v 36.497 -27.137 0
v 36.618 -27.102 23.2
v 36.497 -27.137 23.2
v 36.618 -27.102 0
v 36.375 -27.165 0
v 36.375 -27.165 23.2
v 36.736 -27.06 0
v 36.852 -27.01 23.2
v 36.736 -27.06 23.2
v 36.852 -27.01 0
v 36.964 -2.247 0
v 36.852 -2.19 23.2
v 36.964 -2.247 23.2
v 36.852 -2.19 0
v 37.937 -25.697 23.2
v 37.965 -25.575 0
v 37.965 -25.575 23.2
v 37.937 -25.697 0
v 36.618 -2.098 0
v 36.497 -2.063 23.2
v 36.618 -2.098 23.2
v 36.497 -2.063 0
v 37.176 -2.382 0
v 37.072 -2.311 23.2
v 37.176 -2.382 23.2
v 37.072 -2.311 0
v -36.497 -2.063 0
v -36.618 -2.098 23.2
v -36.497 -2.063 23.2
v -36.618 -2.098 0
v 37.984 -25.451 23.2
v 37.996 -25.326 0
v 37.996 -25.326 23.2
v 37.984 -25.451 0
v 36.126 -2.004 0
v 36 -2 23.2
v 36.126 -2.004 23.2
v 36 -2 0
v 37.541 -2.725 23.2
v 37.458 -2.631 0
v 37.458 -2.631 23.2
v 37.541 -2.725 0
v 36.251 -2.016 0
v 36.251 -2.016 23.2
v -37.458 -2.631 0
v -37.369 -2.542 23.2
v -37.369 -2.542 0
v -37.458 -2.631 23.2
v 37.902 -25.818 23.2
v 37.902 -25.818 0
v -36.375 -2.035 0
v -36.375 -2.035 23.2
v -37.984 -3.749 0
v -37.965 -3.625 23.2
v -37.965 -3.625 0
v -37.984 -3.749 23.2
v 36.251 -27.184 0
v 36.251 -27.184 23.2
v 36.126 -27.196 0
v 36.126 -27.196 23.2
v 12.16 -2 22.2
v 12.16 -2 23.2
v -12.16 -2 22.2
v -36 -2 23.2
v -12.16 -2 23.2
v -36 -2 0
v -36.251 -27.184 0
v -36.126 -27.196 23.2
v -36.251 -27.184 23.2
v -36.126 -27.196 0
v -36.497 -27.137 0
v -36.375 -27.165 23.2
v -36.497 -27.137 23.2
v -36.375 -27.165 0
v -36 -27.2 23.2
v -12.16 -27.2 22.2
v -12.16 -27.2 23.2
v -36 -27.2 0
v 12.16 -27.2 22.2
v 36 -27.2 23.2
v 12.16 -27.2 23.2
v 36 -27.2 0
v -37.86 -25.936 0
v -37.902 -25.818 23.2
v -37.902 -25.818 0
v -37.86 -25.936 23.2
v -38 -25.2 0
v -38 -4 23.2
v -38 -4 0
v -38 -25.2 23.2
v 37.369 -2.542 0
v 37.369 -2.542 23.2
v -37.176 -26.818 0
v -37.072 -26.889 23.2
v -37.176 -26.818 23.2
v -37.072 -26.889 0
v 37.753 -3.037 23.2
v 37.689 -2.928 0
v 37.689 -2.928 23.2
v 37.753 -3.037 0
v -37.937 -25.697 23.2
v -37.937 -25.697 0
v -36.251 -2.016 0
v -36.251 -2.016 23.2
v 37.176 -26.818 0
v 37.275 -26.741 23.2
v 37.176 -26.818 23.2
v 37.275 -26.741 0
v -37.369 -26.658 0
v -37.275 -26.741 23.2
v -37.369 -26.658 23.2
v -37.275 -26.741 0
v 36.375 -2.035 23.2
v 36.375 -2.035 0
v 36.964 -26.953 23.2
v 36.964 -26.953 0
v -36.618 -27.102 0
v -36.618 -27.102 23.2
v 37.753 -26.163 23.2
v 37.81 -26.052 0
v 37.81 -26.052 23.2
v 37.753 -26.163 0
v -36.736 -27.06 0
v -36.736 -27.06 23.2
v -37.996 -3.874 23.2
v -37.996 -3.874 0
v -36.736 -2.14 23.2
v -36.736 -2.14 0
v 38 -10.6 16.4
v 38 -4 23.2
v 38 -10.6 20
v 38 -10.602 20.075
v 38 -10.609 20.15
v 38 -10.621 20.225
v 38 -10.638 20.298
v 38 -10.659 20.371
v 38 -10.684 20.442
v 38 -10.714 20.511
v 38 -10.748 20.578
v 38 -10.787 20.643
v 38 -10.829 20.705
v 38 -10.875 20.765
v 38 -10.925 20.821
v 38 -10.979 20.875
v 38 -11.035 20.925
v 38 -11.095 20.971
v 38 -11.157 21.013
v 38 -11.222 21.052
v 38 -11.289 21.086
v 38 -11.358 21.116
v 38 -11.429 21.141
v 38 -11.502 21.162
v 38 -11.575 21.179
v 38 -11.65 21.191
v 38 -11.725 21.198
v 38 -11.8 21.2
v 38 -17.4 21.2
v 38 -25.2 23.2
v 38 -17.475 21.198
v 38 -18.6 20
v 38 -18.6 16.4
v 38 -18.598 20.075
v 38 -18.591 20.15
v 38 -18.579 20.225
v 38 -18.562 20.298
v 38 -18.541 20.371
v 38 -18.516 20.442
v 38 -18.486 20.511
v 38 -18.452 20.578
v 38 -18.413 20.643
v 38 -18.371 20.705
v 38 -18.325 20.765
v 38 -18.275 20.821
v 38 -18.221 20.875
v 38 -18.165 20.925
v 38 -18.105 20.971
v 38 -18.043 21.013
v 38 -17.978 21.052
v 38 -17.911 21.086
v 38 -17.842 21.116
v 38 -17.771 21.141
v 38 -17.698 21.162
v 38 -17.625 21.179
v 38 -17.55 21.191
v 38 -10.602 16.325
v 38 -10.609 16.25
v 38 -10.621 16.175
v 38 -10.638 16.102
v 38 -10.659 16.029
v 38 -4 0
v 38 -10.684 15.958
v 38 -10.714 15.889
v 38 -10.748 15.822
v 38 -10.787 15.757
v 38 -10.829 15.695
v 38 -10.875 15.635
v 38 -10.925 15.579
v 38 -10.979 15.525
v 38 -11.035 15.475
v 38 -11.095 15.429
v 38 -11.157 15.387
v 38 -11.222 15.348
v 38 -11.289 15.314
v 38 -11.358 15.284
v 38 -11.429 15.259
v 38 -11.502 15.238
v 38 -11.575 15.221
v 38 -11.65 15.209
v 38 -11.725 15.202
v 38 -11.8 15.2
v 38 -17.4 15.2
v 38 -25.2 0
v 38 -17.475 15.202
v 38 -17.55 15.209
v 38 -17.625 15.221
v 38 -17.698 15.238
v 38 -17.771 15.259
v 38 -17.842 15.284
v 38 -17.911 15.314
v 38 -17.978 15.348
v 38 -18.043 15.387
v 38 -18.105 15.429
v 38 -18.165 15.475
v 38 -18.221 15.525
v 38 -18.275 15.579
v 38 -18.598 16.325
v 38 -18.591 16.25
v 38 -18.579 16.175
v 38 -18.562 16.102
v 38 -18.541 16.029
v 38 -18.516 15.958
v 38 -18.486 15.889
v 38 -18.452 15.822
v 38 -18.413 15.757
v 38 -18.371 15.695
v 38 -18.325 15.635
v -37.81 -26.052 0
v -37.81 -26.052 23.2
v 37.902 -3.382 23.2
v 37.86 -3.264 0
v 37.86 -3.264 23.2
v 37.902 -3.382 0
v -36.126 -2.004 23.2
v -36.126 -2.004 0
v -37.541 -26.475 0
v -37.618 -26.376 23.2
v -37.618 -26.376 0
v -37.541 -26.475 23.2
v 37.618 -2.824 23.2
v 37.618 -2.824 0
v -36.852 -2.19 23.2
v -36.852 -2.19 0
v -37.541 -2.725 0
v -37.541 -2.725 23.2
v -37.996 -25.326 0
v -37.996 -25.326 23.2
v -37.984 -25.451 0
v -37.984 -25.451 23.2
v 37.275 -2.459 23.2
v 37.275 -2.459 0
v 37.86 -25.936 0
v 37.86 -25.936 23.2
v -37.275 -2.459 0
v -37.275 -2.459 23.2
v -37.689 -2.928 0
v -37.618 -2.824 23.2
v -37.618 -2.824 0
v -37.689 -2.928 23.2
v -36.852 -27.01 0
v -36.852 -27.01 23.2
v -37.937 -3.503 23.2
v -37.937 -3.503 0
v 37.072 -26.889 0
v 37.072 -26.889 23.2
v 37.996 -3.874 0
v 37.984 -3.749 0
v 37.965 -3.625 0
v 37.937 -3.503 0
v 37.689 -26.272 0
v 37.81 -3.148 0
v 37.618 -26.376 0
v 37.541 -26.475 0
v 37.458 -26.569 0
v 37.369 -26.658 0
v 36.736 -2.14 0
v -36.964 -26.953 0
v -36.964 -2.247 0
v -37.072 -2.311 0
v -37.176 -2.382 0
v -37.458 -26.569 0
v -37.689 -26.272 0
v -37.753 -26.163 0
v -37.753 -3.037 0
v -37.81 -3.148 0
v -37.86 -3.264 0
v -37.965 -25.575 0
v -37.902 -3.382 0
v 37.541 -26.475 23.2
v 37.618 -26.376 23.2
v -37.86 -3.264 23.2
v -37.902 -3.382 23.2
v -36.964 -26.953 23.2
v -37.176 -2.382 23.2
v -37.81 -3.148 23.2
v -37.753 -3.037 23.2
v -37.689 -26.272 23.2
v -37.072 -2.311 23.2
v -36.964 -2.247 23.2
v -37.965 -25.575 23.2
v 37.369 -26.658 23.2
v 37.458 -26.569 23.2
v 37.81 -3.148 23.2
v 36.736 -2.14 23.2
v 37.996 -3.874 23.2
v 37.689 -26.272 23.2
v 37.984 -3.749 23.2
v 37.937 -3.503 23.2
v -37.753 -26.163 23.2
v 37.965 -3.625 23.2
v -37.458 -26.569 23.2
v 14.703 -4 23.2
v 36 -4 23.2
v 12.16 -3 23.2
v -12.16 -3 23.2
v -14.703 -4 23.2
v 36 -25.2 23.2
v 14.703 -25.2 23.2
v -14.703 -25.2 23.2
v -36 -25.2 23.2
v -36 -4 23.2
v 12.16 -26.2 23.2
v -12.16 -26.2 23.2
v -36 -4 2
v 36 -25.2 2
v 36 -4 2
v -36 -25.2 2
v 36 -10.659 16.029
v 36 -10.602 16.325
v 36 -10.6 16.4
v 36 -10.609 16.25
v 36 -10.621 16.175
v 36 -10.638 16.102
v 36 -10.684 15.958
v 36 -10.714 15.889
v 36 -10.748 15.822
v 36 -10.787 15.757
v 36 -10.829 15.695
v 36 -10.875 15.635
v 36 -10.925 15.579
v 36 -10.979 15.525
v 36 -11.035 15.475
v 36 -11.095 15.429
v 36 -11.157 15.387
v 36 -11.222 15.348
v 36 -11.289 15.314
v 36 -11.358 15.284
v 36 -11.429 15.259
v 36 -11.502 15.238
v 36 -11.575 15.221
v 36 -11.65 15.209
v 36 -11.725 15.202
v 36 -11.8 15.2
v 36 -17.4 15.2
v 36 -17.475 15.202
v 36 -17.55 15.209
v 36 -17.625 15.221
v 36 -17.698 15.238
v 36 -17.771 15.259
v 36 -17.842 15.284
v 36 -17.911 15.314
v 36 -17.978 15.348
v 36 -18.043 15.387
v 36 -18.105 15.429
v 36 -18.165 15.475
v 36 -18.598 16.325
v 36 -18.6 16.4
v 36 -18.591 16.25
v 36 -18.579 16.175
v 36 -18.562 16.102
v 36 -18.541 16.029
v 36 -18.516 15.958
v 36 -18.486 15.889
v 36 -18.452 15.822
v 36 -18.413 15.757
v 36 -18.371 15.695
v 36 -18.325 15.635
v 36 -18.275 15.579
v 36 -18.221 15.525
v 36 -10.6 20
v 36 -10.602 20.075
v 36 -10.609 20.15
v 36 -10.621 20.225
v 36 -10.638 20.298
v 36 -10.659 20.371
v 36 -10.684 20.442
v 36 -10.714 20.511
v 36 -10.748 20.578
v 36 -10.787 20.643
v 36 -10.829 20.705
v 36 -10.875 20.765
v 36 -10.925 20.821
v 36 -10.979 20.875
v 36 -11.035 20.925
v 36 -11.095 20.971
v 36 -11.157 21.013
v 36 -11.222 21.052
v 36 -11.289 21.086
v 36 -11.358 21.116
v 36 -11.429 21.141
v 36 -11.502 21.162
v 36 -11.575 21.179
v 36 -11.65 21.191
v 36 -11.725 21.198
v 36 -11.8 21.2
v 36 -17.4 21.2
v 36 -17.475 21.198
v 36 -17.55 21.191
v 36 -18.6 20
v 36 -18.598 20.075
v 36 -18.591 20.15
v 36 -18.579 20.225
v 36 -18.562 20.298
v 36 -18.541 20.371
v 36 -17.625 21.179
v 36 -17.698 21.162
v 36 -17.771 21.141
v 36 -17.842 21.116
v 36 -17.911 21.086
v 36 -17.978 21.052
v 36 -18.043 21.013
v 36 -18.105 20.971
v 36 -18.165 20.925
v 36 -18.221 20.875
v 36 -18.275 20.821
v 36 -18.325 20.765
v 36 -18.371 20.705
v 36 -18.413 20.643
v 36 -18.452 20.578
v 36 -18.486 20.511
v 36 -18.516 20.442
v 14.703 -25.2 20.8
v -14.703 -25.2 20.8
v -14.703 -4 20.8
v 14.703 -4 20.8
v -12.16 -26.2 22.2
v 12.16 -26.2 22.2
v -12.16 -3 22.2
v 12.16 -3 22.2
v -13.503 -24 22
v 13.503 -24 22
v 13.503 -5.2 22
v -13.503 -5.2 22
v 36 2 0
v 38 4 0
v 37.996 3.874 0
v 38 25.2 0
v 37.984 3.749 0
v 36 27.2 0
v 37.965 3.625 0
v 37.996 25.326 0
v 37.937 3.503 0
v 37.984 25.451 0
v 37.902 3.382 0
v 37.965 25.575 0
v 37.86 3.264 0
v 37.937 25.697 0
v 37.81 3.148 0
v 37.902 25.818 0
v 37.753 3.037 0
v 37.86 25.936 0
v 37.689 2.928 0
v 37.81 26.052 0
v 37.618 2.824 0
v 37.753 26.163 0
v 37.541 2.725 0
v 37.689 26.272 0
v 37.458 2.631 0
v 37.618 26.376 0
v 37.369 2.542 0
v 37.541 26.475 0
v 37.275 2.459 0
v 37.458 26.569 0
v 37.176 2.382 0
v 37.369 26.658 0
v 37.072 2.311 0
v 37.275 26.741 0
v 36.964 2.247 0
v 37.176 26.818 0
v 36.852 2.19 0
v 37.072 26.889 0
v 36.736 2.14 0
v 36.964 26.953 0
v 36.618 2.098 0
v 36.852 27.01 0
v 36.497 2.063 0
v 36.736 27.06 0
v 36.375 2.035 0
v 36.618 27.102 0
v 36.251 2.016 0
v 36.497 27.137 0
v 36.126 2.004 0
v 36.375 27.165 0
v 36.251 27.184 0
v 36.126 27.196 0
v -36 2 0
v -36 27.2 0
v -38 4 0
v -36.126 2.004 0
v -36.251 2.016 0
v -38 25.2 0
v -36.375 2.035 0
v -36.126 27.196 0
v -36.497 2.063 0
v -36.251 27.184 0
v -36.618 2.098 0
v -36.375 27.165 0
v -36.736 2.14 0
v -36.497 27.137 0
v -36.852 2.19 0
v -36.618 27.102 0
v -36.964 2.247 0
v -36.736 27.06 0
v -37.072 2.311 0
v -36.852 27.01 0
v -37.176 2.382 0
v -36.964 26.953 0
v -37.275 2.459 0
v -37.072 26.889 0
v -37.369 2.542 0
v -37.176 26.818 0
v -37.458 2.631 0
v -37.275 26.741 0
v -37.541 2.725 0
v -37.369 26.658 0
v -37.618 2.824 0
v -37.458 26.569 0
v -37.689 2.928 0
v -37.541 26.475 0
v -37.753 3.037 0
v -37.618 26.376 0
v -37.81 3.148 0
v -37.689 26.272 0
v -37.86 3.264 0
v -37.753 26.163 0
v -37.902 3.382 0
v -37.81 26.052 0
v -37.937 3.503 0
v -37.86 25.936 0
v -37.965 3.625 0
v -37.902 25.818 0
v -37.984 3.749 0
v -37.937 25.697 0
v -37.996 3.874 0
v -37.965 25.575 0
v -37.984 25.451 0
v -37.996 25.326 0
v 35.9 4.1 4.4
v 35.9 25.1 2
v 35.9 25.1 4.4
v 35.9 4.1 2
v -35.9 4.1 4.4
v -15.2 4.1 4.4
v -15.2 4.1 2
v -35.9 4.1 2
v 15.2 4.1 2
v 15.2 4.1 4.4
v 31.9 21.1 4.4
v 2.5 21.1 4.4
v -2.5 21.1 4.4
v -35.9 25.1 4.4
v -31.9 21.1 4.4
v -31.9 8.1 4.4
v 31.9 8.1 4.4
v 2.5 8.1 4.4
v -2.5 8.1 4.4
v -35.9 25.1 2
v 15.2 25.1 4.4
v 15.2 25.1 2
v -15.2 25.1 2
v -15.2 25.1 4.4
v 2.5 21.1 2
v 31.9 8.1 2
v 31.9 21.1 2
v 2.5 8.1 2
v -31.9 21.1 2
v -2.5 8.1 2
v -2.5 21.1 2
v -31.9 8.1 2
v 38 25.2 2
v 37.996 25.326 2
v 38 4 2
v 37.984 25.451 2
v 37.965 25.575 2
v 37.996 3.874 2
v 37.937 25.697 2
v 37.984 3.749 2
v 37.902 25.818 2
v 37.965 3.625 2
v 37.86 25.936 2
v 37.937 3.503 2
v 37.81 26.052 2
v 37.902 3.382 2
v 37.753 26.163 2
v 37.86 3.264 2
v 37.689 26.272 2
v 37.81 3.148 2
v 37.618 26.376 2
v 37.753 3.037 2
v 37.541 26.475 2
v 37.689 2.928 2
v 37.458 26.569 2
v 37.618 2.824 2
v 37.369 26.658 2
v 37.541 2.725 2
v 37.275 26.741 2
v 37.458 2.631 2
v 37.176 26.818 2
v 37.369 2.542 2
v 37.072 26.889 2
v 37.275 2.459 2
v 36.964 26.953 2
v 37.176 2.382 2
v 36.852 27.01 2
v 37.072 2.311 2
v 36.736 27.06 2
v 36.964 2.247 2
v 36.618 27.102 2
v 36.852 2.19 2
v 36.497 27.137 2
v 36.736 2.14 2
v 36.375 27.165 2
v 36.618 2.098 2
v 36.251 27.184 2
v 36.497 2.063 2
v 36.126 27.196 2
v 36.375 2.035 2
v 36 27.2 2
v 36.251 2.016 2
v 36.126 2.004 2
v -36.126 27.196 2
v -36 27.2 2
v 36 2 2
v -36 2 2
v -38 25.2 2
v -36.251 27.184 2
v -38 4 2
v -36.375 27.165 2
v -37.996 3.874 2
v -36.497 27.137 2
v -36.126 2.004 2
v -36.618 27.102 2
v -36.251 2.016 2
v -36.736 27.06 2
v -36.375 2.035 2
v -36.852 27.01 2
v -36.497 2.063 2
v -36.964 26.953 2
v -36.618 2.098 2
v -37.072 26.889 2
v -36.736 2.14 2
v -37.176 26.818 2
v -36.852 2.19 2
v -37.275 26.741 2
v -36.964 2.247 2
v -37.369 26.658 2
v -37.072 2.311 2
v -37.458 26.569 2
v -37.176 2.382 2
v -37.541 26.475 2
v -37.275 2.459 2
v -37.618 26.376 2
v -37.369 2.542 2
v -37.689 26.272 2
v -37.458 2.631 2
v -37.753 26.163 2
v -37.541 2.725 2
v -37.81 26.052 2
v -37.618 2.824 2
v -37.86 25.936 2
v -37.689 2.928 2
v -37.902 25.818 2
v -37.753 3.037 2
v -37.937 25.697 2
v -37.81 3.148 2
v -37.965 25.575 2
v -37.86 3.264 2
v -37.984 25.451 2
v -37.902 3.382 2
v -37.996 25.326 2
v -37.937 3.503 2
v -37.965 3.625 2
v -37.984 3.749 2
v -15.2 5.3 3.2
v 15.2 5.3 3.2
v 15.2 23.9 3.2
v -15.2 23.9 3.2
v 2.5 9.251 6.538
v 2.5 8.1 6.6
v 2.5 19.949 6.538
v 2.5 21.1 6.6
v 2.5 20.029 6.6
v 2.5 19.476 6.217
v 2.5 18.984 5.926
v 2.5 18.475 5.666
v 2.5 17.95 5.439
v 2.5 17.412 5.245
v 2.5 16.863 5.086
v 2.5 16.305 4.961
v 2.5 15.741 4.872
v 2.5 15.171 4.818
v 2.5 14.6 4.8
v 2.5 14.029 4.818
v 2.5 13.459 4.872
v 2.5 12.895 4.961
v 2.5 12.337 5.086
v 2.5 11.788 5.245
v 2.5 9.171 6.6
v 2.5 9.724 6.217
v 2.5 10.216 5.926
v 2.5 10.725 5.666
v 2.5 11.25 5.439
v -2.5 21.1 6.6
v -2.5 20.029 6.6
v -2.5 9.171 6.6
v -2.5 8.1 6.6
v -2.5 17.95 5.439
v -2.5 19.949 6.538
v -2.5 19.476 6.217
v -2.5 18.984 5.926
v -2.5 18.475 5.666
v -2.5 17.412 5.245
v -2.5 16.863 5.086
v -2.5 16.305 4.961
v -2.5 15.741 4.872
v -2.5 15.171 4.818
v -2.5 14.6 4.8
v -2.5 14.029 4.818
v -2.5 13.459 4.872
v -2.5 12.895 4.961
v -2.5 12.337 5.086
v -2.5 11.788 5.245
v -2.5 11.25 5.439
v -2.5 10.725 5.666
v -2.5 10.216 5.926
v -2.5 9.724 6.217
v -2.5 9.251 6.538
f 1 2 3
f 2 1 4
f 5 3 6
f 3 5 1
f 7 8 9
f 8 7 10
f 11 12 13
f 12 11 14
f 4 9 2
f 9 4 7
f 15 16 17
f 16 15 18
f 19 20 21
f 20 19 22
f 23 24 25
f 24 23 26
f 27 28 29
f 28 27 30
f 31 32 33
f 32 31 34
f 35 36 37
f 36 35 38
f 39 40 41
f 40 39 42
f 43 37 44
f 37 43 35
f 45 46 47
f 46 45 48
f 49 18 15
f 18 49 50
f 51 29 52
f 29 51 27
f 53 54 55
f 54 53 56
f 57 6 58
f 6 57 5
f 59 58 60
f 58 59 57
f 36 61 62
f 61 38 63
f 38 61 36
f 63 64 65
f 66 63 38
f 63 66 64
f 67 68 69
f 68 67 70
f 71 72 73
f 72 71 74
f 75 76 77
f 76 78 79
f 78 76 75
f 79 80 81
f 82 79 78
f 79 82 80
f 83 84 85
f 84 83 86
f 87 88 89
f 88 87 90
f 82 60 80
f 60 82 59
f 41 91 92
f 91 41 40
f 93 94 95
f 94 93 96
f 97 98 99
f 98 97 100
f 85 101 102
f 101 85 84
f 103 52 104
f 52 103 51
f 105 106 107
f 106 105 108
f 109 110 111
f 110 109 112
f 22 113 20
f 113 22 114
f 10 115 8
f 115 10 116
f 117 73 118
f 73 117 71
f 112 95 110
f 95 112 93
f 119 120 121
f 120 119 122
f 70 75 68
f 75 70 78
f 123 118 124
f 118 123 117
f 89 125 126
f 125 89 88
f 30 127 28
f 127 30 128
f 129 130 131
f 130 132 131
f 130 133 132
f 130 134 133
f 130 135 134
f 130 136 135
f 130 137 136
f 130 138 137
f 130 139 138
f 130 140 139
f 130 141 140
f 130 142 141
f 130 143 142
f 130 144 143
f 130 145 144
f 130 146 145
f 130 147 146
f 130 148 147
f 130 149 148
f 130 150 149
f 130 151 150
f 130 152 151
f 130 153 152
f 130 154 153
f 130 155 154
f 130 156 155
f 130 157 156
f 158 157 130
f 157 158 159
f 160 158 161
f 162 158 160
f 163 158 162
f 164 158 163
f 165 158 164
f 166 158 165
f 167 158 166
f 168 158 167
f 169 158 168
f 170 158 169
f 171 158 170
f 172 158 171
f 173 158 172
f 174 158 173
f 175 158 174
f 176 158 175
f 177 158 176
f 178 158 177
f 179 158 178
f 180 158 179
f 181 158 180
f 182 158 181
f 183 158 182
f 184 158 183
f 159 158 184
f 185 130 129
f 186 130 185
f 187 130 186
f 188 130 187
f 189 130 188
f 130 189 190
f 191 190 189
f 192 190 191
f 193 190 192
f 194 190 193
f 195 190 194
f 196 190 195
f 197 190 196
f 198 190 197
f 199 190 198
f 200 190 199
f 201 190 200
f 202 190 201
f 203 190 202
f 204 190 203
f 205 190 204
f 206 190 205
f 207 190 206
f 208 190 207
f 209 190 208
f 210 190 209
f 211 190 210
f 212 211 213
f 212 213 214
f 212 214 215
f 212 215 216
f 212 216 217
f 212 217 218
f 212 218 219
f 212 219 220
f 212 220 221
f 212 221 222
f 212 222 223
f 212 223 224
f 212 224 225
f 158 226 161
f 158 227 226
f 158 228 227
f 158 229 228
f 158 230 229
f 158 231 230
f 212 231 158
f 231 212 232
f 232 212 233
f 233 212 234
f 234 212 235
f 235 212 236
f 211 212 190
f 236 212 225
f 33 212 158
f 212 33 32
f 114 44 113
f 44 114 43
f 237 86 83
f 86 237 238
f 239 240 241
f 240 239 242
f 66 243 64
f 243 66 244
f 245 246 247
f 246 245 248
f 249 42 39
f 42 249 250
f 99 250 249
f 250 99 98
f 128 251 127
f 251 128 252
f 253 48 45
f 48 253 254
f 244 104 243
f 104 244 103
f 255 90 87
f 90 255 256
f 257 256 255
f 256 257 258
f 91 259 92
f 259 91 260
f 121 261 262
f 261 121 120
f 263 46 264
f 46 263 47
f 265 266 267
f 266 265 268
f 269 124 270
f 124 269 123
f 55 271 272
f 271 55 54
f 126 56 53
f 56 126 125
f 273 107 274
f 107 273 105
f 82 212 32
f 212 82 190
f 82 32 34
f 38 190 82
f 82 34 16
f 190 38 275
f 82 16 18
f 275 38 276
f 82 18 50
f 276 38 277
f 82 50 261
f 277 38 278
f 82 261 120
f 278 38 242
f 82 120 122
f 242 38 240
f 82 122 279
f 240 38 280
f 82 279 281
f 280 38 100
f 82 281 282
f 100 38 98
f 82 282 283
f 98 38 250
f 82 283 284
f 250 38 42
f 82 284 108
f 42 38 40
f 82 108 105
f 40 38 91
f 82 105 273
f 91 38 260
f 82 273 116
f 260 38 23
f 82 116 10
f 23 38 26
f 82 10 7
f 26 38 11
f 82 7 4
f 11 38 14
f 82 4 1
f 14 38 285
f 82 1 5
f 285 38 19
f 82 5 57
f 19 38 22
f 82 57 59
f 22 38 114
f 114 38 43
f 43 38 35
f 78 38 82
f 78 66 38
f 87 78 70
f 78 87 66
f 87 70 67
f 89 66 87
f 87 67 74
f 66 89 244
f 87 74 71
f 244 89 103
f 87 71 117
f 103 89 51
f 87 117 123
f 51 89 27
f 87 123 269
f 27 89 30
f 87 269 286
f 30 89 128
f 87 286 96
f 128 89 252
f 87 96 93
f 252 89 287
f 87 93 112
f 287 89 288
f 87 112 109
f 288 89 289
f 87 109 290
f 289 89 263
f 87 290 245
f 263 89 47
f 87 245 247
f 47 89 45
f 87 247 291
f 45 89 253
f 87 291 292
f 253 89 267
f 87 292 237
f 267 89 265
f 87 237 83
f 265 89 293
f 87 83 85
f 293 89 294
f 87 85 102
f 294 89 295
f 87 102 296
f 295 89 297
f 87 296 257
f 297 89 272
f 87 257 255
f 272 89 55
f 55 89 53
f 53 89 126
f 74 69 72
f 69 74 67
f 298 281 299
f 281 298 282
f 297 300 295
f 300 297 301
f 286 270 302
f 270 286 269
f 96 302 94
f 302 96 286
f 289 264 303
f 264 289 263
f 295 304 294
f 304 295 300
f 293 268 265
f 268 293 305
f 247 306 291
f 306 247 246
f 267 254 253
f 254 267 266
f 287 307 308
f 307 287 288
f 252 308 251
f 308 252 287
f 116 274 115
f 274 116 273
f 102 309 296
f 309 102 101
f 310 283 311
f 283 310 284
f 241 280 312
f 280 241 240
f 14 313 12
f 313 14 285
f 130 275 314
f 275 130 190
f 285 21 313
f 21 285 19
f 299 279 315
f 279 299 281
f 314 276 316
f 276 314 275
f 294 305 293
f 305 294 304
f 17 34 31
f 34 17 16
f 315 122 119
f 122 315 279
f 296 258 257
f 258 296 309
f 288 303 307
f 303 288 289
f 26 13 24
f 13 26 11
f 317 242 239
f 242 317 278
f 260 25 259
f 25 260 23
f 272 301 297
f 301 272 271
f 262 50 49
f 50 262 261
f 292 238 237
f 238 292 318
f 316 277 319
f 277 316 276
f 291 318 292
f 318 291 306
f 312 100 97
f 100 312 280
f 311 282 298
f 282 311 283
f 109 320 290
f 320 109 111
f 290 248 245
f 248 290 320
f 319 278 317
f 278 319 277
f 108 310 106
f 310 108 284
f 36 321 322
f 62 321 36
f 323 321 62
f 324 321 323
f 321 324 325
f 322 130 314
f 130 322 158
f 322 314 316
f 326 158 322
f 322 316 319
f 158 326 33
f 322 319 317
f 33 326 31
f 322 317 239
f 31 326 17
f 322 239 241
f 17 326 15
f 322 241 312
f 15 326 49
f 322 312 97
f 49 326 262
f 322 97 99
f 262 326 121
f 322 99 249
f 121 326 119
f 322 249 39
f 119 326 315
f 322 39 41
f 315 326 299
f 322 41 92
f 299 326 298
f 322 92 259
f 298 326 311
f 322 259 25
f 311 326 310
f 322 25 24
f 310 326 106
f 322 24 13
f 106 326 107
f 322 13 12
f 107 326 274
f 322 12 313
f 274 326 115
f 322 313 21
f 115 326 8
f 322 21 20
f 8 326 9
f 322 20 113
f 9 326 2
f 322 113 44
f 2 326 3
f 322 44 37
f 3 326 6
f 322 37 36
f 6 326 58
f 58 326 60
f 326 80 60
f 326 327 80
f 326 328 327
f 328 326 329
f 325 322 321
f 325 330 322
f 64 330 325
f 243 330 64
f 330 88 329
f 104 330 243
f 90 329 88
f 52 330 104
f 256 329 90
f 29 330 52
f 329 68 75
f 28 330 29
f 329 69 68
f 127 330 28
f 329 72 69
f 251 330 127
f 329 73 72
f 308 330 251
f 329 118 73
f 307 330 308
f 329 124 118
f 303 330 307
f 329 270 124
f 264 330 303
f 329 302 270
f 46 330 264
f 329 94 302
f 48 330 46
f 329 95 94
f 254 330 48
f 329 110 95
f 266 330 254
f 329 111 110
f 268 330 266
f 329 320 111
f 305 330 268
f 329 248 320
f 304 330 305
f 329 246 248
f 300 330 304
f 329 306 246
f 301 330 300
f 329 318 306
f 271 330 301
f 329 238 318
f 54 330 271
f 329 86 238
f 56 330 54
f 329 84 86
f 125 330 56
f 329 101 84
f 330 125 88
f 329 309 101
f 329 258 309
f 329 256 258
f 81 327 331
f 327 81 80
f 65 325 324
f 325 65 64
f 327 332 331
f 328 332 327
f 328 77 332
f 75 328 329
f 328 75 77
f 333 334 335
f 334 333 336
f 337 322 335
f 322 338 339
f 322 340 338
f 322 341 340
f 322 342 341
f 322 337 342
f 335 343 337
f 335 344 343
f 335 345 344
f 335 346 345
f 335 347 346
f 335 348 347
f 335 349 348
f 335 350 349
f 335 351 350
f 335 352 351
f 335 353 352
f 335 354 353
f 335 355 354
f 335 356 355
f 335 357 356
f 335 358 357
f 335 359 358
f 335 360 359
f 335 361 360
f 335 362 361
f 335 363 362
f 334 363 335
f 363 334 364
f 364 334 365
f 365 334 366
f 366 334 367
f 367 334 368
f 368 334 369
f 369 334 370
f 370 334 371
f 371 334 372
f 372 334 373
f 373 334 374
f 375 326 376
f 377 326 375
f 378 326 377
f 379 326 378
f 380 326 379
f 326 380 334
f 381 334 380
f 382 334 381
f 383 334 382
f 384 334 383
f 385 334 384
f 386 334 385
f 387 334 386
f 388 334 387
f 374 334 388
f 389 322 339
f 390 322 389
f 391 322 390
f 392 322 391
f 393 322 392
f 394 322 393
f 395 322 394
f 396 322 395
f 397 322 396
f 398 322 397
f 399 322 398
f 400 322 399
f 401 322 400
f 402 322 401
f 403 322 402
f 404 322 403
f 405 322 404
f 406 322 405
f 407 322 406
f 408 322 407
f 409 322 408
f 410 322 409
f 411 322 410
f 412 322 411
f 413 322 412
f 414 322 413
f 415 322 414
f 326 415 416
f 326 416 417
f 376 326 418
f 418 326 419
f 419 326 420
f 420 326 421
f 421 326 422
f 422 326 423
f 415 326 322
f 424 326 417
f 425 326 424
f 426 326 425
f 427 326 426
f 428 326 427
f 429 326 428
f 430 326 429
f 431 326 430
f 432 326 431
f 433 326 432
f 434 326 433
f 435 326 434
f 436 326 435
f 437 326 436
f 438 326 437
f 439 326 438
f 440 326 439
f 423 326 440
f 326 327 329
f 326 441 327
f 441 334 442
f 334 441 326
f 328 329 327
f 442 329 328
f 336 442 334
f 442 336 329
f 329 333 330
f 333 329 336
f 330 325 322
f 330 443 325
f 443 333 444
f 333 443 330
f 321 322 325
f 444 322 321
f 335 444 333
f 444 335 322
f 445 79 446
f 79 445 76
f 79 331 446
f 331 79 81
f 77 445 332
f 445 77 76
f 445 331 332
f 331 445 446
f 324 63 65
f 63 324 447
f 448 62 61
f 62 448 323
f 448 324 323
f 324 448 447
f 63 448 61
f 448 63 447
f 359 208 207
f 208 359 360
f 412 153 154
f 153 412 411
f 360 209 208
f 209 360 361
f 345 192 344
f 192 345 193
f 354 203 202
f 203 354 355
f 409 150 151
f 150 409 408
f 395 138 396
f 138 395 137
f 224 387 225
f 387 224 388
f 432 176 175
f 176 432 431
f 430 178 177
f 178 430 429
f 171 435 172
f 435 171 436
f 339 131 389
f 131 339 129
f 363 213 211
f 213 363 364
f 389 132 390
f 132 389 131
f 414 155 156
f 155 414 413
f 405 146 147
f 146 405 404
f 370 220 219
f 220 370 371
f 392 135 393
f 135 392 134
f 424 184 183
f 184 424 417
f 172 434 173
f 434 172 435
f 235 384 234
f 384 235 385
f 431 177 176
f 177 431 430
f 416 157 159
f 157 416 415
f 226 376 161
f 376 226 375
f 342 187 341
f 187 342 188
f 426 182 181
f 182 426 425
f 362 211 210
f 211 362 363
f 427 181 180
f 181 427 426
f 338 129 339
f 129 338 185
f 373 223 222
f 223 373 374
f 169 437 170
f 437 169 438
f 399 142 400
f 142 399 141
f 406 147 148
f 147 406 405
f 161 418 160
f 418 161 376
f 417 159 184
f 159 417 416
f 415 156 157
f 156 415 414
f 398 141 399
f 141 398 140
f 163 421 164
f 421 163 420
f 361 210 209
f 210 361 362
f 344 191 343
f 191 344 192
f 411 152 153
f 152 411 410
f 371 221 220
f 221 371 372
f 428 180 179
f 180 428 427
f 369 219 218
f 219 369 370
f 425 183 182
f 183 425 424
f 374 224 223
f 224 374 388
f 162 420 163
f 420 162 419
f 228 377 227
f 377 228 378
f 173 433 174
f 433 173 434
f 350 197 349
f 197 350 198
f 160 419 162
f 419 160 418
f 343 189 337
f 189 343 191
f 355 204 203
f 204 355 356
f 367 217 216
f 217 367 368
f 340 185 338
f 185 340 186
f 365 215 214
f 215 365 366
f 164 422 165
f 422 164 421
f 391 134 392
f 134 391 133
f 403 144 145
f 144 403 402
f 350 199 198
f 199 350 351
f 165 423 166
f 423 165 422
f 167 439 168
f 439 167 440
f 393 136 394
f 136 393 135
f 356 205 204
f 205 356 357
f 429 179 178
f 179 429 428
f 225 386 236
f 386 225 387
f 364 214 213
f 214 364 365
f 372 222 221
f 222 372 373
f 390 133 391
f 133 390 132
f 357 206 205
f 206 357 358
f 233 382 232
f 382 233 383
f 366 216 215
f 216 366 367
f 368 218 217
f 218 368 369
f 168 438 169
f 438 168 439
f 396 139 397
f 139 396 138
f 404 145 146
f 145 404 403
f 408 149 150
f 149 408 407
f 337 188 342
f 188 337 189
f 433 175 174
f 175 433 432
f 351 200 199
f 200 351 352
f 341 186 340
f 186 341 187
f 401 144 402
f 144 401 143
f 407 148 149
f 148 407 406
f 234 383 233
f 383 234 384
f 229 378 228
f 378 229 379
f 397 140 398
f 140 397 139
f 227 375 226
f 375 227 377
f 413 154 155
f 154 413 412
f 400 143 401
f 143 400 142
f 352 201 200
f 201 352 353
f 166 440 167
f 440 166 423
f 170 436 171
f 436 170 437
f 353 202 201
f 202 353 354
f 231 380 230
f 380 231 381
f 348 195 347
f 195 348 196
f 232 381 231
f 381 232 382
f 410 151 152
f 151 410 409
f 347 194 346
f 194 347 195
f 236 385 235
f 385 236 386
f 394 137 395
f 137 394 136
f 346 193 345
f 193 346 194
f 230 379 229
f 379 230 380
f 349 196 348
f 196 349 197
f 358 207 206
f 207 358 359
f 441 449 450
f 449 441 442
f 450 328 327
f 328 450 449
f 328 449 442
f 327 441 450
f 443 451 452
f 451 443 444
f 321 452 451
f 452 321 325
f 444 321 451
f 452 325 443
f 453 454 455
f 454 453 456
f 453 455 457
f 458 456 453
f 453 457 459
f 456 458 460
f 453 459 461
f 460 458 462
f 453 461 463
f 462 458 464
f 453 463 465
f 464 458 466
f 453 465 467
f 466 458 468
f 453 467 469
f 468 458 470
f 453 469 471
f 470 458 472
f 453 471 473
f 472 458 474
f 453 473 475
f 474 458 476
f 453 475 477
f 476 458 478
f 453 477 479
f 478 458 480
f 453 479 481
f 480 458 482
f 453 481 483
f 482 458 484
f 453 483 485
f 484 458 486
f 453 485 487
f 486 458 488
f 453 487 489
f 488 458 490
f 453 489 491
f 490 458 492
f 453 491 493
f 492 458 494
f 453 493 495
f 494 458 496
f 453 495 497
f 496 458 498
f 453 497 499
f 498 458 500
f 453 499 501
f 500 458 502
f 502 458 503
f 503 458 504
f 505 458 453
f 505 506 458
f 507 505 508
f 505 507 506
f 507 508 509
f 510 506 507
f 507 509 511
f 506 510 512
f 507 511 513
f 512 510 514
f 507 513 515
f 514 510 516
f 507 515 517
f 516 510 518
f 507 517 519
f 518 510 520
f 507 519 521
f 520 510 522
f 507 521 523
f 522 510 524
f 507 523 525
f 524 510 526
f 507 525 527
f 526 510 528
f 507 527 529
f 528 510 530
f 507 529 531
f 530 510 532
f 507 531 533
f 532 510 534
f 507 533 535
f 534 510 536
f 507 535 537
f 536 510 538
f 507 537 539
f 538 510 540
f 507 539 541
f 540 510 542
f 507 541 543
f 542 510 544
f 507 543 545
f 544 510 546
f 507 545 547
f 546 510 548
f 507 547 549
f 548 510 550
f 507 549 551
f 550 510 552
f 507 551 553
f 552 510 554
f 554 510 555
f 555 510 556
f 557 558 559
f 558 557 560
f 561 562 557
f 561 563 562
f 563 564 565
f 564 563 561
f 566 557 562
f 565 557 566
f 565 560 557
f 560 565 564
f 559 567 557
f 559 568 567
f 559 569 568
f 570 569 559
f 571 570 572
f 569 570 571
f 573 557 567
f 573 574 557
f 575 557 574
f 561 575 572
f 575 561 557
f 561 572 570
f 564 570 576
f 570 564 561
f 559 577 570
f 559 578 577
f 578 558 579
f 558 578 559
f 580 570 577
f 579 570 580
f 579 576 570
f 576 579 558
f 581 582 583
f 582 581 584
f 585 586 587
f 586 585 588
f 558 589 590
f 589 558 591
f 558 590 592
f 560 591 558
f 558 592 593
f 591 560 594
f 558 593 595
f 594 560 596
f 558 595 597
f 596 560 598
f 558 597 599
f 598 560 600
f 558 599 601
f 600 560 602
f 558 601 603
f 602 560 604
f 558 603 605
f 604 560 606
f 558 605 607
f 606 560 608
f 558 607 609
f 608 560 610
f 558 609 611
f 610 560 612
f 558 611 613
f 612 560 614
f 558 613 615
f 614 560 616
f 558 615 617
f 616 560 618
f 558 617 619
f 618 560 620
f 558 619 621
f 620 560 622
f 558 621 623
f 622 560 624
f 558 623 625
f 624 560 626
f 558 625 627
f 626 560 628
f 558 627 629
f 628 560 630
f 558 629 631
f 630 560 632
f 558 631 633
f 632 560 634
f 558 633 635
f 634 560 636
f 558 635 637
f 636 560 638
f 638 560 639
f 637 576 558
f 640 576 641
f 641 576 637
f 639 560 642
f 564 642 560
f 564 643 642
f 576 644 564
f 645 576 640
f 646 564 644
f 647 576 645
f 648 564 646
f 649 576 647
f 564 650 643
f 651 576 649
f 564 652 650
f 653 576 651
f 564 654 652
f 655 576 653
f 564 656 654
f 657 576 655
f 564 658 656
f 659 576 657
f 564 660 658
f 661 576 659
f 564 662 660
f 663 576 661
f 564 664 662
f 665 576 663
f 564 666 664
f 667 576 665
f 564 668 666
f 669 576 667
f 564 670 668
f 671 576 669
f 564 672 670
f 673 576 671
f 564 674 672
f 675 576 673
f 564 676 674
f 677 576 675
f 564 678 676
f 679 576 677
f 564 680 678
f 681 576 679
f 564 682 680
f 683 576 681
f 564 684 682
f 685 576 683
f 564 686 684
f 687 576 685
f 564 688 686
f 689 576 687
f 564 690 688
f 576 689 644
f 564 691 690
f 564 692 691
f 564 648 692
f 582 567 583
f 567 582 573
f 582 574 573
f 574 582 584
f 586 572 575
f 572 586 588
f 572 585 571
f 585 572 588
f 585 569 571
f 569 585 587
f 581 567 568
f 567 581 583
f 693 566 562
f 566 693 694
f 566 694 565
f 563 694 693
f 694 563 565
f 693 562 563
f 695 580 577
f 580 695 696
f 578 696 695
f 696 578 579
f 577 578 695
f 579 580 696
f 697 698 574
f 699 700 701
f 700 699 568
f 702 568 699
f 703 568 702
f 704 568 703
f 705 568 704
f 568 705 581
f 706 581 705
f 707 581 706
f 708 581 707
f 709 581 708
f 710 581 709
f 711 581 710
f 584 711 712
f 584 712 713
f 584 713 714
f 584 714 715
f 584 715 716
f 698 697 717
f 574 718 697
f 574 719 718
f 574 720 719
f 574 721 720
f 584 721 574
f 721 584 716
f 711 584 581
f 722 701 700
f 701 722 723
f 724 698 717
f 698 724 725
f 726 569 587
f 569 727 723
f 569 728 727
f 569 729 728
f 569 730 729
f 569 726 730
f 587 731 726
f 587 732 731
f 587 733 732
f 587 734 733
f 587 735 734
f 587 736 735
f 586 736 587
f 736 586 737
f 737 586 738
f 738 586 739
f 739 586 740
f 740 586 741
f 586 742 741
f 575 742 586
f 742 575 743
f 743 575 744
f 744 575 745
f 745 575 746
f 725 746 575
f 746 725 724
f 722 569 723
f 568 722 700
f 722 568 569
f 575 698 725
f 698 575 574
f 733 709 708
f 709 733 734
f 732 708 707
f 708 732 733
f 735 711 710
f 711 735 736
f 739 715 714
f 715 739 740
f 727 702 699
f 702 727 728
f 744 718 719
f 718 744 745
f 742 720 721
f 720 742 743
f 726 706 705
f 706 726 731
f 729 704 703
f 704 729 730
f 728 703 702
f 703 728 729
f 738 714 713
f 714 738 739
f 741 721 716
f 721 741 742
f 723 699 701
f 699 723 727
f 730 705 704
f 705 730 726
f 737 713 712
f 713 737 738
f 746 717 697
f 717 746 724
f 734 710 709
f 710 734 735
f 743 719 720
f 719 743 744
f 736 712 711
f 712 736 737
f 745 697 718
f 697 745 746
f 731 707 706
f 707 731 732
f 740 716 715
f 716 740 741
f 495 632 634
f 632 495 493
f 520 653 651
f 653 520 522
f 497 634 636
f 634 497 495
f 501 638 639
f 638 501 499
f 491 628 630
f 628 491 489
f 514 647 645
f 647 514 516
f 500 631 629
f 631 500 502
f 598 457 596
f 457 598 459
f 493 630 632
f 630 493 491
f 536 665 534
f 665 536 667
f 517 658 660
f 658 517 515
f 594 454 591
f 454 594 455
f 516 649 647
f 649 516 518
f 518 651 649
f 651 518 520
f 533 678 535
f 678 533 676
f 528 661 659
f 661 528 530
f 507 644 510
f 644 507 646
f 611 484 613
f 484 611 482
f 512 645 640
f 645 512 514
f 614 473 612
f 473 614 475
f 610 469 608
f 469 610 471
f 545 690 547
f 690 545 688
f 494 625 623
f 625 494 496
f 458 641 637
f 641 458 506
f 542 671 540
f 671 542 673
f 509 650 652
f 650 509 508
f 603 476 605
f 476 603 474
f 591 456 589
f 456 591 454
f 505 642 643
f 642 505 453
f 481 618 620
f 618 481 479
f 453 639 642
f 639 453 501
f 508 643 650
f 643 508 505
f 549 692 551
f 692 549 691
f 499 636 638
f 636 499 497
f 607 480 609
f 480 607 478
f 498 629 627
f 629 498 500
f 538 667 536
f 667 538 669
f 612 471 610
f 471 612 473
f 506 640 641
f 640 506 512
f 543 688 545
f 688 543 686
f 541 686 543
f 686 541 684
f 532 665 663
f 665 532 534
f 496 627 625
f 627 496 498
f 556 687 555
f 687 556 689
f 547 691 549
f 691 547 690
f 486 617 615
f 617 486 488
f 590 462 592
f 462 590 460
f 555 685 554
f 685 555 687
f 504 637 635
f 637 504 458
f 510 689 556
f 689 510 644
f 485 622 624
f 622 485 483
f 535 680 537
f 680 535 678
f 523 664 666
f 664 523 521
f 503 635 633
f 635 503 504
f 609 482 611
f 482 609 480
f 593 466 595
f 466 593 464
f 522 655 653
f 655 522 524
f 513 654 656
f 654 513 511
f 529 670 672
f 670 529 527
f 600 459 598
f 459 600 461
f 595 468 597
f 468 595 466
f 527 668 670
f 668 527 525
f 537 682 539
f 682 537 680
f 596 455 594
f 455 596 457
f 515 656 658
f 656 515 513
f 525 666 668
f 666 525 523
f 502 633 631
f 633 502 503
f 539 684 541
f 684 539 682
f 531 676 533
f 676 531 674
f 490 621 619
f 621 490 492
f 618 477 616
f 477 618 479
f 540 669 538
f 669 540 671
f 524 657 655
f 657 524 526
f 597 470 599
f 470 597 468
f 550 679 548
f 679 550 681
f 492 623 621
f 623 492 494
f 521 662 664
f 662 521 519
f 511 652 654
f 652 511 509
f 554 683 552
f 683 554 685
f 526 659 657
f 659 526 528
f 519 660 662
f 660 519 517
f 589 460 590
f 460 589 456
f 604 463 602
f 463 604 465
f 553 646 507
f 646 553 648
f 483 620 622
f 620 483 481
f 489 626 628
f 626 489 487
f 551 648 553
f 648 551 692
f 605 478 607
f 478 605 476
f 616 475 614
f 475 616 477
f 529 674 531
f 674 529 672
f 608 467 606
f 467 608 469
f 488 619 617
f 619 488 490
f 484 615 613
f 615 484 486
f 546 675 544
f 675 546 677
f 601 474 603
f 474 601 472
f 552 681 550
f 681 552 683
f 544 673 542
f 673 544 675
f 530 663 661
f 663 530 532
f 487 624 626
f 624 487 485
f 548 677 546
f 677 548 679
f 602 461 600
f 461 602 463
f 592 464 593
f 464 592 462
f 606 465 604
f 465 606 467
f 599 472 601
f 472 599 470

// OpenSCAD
/* [Hidden] */

battery_length = 70.0;
battery_diameter = 18.2;

/* [STL export] */

// Which one would you like to see?
part = 0;//[0:Both - side by side, 1:Both - closed box, 2:Box only, 3: Top only]

// Draw the battery?
draw_battery=0;//[0: No, 1: Yes]

/* [Hidden] */

// Size of your printer's nozzle in mm
nozzle_size = 0.2; //[0:0.05:2]

// Number of walls the print should have
number_of_walls = 10;

// Tolerance (use 0.2 for FDM)
tolerance = 0.2; // [0.1:0.1:0.4]

// Interior dimension X in mm
interior_width = battery_length + 2; //[0:0.05:200.0]

// Interior dimension Y in mm
interior_length = battery_diameter + 3.0; //[0:0.05:200.0]

// Interior dimension Z in mm
interior_height = battery_diameter + 3.0; //[0:0.05:200.0]

// interior corner radius in mm
radius = 0.0;

/* [Hidden] */

// Number of walls the hook should have
hook_walls = 6;

// What fraction of the flat X side should the hook take up? (0 for no hook)
x_hook_fraction = 0.4; // [0:0.1:1.0]

// What fraction of the left/right hooks should have a slot behind them? (0 for no slot)
x_slot_fraction = 0.8; // [0:0.1:2]

// What fraction of the flat Y side should the hook take up? (0 for no hook)
y_hook_fraction = 0.0; // [0:0.1:1.0]

// What fraction of the top/bottom hooks should have a slot behind them? (0 for no slot)
y_slot_fraction = 0.8; // [0:0.1:2]

/* [Hidden] */
$fn=100;

wall_thickness = nozzle_size * number_of_walls;

// Outer dimensions
exterior_width = interior_width + 2 * wall_thickness;
exterior_length = interior_length + 2 * wall_thickness;
exterior_height = interior_height + 2 * wall_thickness;

hook_thickness = hook_walls * nozzle_size;

top_cover_wall_thickness = hook_thickness + wall_thickness;

y_hook_length = (exterior_length - 2 * radius) * y_hook_fraction;
x_hook_length = (exterior_width - 2 * radius) * x_hook_fraction;

battery_x = 0;
battery_y = 0;

module battery(c = "blue") {
    
    translate([battery_x, battery_y, wall_thickness + battery_diameter/2]) rotate([0, 90, 0]) {
        color(c)
        cylinder(h=battery_length, d=battery_diameter, center=true);
    }
}

module battery_cable_hole() {
    battery_cable_radius = 1.2;
    battery_cable_width = 8.0;
    battery_cable_height = 6.0;
    battery_cable_hole_length = 10;

    battery_cable_x = (interior_width - battery_cable_hole_length + wall_thickness)/2;
    battery_cable_z = battery_cable_height/2 + battery_diameter - 3.0;

    color("Red") {
        translate([battery_cable_x, 0, battery_cable_z]) rotate([90, 0, 90]) 
        linear_extrude(battery_cable_hole_length) {
            rounded_rect(battery_cable_radius, battery_cable_width, battery_cable_height, center=true);
        }
    }
}


module box_interior() {
    offset(r=radius) {
        square([interior_width-2*radius, interior_length-2*radius], center=true);
    }
}

module box_exterior() {
    offset(r=wall_thickness) {
        box_interior();
    }
}

module rounded_rect(r, w, l, center=true) {
    offset(r=r) {
        square([w-2*r, l-2*r], center=center);
    }    
}

module bottom_box() {
    difference() {
        // Solid box
        linear_extrude(exterior_height - wall_thickness) {
            box_exterior();
        }
        
        // Hollow out
        translate([0, 0, wall_thickness]) linear_extrude(exterior_height) {
            box_interior();
        }

        // Left/right slots
        left_slot();
        rotate([180,180,0]) left_slot();

        // Front/back slots
        front_slot();
        rotate([180,180,0]) front_slot();

        battery_cable_hole();
    }

    // Left/Right hook
    left_hook();
    rotate([180,180,0]) left_hook();

    // Front/Back hook
    front_hook();
    rotate([180,180,0]) front_hook();
}

module left_hook() {
    translate([(exterior_width - 2 * wall_thickness)/2, -y_hook_length / 2, exterior_height - wall_thickness]) 
    rotate([0,90,90]) {
        base_hook(y_hook_length);
    }
}

module front_hook() {
    translate([-x_hook_length/2, -exterior_length/2 + wall_thickness, exterior_height - wall_thickness]) 
    rotate([90, 90, 90]) {
        base_hook(x_hook_length);
    }
}

module base_hook(hook_length) {
    difference(){
        linear_extrude(hook_length){
            polygon(points=[[0,0],[2*hook_thickness,0],[hook_thickness,hook_thickness]]);
        }
        translate([hook_thickness, hook_thickness, 0]) rotate([45,0,0]) cube(2*hook_thickness, center=true);
        translate([hook_thickness, hook_thickness, hook_length]) rotate([45,0,0]) cube(2*hook_thickness, center=true);        
    }
}

module left_slot() {
    x_slot_fraction = y_hook_length * x_slot_fraction;
    epsilon=2; // ensure it definitely protrudes

    translate([exterior_width / 2 + epsilon + wall_thickness/2, -x_slot_fraction / 2, exterior_height - wall_thickness/2]) 
    rotate([0,90,90]) {
        cube([wall_thickness, wall_thickness+epsilon, x_slot_fraction]);
    }
}

module front_slot() {
    y_slot_fraction = x_hook_length * y_slot_fraction;

    epsilon=2; // ensure it definitely protrudes
    translate([-y_slot_fraction / 2, -exterior_length / 2 - epsilon - wall_thickness/2, exterior_height - wall_thickness/2]) 
    rotate([90,90,90]) {
        cube([wall_thickness, wall_thickness+epsilon, y_slot_fraction]);
    }
}

module right_groove() {
    translate([-tolerance/2 + (exterior_width-2*wall_thickness) / 2,-y_hook_length/2,wall_thickness+hook_thickness*2]) rotate([0,90,90]) linear_extrude(y_hook_length) {
        base_groove();
    }
}


module front_groove() {
    translate([-x_hook_length/2, -exterior_length/2 + wall_thickness+tolerance/2, wall_thickness + hook_thickness*2]) rotate([90,90,90]) linear_extrude(x_hook_length){
        base_groove();
    }
}

module base_groove() {
    polygon(points=[[0,0],[0, -1], [2*hook_thickness, -1],[2*hook_thickness,0],[hook_thickness,hook_thickness]]);
}

module battery_standoffs() {
    standoff_width = 5;
    standoff_length = interior_length - wall_thickness*4 - tolerance;
    standoff_height = 4.6;

    difference()
    {
        color("red")
        translate([-standoff_width/2, -standoff_length/2, wall_thickness])
        cube([standoff_width, standoff_length, standoff_height]);

        translate([0, 0, top_cover_wall_thickness - tolerance*2])
        battery("purple");
    }
}

module top_cover() {
   // Top face
    difference(){
        linear_extrude(wall_thickness) {
            box_exterior();
        }
    }
    
    difference(){
        // Wall of top cover
        inset = wall_thickness + tolerance/2;
        linear_extrude(wall_thickness+hook_thickness*2){
            offset(r=-inset) {
                box_exterior();
            }
        }
        
        // Hollow out
        translate([0,0,wall_thickness]) linear_extrude(exterior_height){
            offset(r=-wall_thickness*2) {
                offset(r=-inset) {
                    box_exterior();
                }
            }
        }
        
        right_groove();
        rotate([180,180,0]) right_groove();
        front_groove();
        rotate([180,180,0])  front_groove();
    }

    battery_standoffs();
}

module print_part() {
    if (part == 0) {
        both_side_by_side();
    } 
    else if (part == 1) {
        both_closed();
    }    
    else if (part == 2) {
        bottom_box();

        if (draw_battery) {
            battery();
        }        
    } 
    else if (part == 3) {
        top_cover();

        if (draw_battery) {
            translate([0, 0, top_cover_wall_thickness - tolerance])
            battery();
        }                
    }
}

module both_side_by_side() {
    translate([0, -(exterior_length/2 + wall_thickness), 0]) {
        bottom_box();

        if (draw_battery) {
            battery();
        }                

    }

    translate([0, +(exterior_length/2 + wall_thickness), 0]) 
    top_cover();
}

module both_closed() {
    translate([0, 0, 0]) {
        bottom_box();

        if (draw_battery) {
            battery();
        }
    }

    translate([0, 0, exterior_height]) mirror([0, 0, 1]) {
        top_cover();
    }
}

print_part();
